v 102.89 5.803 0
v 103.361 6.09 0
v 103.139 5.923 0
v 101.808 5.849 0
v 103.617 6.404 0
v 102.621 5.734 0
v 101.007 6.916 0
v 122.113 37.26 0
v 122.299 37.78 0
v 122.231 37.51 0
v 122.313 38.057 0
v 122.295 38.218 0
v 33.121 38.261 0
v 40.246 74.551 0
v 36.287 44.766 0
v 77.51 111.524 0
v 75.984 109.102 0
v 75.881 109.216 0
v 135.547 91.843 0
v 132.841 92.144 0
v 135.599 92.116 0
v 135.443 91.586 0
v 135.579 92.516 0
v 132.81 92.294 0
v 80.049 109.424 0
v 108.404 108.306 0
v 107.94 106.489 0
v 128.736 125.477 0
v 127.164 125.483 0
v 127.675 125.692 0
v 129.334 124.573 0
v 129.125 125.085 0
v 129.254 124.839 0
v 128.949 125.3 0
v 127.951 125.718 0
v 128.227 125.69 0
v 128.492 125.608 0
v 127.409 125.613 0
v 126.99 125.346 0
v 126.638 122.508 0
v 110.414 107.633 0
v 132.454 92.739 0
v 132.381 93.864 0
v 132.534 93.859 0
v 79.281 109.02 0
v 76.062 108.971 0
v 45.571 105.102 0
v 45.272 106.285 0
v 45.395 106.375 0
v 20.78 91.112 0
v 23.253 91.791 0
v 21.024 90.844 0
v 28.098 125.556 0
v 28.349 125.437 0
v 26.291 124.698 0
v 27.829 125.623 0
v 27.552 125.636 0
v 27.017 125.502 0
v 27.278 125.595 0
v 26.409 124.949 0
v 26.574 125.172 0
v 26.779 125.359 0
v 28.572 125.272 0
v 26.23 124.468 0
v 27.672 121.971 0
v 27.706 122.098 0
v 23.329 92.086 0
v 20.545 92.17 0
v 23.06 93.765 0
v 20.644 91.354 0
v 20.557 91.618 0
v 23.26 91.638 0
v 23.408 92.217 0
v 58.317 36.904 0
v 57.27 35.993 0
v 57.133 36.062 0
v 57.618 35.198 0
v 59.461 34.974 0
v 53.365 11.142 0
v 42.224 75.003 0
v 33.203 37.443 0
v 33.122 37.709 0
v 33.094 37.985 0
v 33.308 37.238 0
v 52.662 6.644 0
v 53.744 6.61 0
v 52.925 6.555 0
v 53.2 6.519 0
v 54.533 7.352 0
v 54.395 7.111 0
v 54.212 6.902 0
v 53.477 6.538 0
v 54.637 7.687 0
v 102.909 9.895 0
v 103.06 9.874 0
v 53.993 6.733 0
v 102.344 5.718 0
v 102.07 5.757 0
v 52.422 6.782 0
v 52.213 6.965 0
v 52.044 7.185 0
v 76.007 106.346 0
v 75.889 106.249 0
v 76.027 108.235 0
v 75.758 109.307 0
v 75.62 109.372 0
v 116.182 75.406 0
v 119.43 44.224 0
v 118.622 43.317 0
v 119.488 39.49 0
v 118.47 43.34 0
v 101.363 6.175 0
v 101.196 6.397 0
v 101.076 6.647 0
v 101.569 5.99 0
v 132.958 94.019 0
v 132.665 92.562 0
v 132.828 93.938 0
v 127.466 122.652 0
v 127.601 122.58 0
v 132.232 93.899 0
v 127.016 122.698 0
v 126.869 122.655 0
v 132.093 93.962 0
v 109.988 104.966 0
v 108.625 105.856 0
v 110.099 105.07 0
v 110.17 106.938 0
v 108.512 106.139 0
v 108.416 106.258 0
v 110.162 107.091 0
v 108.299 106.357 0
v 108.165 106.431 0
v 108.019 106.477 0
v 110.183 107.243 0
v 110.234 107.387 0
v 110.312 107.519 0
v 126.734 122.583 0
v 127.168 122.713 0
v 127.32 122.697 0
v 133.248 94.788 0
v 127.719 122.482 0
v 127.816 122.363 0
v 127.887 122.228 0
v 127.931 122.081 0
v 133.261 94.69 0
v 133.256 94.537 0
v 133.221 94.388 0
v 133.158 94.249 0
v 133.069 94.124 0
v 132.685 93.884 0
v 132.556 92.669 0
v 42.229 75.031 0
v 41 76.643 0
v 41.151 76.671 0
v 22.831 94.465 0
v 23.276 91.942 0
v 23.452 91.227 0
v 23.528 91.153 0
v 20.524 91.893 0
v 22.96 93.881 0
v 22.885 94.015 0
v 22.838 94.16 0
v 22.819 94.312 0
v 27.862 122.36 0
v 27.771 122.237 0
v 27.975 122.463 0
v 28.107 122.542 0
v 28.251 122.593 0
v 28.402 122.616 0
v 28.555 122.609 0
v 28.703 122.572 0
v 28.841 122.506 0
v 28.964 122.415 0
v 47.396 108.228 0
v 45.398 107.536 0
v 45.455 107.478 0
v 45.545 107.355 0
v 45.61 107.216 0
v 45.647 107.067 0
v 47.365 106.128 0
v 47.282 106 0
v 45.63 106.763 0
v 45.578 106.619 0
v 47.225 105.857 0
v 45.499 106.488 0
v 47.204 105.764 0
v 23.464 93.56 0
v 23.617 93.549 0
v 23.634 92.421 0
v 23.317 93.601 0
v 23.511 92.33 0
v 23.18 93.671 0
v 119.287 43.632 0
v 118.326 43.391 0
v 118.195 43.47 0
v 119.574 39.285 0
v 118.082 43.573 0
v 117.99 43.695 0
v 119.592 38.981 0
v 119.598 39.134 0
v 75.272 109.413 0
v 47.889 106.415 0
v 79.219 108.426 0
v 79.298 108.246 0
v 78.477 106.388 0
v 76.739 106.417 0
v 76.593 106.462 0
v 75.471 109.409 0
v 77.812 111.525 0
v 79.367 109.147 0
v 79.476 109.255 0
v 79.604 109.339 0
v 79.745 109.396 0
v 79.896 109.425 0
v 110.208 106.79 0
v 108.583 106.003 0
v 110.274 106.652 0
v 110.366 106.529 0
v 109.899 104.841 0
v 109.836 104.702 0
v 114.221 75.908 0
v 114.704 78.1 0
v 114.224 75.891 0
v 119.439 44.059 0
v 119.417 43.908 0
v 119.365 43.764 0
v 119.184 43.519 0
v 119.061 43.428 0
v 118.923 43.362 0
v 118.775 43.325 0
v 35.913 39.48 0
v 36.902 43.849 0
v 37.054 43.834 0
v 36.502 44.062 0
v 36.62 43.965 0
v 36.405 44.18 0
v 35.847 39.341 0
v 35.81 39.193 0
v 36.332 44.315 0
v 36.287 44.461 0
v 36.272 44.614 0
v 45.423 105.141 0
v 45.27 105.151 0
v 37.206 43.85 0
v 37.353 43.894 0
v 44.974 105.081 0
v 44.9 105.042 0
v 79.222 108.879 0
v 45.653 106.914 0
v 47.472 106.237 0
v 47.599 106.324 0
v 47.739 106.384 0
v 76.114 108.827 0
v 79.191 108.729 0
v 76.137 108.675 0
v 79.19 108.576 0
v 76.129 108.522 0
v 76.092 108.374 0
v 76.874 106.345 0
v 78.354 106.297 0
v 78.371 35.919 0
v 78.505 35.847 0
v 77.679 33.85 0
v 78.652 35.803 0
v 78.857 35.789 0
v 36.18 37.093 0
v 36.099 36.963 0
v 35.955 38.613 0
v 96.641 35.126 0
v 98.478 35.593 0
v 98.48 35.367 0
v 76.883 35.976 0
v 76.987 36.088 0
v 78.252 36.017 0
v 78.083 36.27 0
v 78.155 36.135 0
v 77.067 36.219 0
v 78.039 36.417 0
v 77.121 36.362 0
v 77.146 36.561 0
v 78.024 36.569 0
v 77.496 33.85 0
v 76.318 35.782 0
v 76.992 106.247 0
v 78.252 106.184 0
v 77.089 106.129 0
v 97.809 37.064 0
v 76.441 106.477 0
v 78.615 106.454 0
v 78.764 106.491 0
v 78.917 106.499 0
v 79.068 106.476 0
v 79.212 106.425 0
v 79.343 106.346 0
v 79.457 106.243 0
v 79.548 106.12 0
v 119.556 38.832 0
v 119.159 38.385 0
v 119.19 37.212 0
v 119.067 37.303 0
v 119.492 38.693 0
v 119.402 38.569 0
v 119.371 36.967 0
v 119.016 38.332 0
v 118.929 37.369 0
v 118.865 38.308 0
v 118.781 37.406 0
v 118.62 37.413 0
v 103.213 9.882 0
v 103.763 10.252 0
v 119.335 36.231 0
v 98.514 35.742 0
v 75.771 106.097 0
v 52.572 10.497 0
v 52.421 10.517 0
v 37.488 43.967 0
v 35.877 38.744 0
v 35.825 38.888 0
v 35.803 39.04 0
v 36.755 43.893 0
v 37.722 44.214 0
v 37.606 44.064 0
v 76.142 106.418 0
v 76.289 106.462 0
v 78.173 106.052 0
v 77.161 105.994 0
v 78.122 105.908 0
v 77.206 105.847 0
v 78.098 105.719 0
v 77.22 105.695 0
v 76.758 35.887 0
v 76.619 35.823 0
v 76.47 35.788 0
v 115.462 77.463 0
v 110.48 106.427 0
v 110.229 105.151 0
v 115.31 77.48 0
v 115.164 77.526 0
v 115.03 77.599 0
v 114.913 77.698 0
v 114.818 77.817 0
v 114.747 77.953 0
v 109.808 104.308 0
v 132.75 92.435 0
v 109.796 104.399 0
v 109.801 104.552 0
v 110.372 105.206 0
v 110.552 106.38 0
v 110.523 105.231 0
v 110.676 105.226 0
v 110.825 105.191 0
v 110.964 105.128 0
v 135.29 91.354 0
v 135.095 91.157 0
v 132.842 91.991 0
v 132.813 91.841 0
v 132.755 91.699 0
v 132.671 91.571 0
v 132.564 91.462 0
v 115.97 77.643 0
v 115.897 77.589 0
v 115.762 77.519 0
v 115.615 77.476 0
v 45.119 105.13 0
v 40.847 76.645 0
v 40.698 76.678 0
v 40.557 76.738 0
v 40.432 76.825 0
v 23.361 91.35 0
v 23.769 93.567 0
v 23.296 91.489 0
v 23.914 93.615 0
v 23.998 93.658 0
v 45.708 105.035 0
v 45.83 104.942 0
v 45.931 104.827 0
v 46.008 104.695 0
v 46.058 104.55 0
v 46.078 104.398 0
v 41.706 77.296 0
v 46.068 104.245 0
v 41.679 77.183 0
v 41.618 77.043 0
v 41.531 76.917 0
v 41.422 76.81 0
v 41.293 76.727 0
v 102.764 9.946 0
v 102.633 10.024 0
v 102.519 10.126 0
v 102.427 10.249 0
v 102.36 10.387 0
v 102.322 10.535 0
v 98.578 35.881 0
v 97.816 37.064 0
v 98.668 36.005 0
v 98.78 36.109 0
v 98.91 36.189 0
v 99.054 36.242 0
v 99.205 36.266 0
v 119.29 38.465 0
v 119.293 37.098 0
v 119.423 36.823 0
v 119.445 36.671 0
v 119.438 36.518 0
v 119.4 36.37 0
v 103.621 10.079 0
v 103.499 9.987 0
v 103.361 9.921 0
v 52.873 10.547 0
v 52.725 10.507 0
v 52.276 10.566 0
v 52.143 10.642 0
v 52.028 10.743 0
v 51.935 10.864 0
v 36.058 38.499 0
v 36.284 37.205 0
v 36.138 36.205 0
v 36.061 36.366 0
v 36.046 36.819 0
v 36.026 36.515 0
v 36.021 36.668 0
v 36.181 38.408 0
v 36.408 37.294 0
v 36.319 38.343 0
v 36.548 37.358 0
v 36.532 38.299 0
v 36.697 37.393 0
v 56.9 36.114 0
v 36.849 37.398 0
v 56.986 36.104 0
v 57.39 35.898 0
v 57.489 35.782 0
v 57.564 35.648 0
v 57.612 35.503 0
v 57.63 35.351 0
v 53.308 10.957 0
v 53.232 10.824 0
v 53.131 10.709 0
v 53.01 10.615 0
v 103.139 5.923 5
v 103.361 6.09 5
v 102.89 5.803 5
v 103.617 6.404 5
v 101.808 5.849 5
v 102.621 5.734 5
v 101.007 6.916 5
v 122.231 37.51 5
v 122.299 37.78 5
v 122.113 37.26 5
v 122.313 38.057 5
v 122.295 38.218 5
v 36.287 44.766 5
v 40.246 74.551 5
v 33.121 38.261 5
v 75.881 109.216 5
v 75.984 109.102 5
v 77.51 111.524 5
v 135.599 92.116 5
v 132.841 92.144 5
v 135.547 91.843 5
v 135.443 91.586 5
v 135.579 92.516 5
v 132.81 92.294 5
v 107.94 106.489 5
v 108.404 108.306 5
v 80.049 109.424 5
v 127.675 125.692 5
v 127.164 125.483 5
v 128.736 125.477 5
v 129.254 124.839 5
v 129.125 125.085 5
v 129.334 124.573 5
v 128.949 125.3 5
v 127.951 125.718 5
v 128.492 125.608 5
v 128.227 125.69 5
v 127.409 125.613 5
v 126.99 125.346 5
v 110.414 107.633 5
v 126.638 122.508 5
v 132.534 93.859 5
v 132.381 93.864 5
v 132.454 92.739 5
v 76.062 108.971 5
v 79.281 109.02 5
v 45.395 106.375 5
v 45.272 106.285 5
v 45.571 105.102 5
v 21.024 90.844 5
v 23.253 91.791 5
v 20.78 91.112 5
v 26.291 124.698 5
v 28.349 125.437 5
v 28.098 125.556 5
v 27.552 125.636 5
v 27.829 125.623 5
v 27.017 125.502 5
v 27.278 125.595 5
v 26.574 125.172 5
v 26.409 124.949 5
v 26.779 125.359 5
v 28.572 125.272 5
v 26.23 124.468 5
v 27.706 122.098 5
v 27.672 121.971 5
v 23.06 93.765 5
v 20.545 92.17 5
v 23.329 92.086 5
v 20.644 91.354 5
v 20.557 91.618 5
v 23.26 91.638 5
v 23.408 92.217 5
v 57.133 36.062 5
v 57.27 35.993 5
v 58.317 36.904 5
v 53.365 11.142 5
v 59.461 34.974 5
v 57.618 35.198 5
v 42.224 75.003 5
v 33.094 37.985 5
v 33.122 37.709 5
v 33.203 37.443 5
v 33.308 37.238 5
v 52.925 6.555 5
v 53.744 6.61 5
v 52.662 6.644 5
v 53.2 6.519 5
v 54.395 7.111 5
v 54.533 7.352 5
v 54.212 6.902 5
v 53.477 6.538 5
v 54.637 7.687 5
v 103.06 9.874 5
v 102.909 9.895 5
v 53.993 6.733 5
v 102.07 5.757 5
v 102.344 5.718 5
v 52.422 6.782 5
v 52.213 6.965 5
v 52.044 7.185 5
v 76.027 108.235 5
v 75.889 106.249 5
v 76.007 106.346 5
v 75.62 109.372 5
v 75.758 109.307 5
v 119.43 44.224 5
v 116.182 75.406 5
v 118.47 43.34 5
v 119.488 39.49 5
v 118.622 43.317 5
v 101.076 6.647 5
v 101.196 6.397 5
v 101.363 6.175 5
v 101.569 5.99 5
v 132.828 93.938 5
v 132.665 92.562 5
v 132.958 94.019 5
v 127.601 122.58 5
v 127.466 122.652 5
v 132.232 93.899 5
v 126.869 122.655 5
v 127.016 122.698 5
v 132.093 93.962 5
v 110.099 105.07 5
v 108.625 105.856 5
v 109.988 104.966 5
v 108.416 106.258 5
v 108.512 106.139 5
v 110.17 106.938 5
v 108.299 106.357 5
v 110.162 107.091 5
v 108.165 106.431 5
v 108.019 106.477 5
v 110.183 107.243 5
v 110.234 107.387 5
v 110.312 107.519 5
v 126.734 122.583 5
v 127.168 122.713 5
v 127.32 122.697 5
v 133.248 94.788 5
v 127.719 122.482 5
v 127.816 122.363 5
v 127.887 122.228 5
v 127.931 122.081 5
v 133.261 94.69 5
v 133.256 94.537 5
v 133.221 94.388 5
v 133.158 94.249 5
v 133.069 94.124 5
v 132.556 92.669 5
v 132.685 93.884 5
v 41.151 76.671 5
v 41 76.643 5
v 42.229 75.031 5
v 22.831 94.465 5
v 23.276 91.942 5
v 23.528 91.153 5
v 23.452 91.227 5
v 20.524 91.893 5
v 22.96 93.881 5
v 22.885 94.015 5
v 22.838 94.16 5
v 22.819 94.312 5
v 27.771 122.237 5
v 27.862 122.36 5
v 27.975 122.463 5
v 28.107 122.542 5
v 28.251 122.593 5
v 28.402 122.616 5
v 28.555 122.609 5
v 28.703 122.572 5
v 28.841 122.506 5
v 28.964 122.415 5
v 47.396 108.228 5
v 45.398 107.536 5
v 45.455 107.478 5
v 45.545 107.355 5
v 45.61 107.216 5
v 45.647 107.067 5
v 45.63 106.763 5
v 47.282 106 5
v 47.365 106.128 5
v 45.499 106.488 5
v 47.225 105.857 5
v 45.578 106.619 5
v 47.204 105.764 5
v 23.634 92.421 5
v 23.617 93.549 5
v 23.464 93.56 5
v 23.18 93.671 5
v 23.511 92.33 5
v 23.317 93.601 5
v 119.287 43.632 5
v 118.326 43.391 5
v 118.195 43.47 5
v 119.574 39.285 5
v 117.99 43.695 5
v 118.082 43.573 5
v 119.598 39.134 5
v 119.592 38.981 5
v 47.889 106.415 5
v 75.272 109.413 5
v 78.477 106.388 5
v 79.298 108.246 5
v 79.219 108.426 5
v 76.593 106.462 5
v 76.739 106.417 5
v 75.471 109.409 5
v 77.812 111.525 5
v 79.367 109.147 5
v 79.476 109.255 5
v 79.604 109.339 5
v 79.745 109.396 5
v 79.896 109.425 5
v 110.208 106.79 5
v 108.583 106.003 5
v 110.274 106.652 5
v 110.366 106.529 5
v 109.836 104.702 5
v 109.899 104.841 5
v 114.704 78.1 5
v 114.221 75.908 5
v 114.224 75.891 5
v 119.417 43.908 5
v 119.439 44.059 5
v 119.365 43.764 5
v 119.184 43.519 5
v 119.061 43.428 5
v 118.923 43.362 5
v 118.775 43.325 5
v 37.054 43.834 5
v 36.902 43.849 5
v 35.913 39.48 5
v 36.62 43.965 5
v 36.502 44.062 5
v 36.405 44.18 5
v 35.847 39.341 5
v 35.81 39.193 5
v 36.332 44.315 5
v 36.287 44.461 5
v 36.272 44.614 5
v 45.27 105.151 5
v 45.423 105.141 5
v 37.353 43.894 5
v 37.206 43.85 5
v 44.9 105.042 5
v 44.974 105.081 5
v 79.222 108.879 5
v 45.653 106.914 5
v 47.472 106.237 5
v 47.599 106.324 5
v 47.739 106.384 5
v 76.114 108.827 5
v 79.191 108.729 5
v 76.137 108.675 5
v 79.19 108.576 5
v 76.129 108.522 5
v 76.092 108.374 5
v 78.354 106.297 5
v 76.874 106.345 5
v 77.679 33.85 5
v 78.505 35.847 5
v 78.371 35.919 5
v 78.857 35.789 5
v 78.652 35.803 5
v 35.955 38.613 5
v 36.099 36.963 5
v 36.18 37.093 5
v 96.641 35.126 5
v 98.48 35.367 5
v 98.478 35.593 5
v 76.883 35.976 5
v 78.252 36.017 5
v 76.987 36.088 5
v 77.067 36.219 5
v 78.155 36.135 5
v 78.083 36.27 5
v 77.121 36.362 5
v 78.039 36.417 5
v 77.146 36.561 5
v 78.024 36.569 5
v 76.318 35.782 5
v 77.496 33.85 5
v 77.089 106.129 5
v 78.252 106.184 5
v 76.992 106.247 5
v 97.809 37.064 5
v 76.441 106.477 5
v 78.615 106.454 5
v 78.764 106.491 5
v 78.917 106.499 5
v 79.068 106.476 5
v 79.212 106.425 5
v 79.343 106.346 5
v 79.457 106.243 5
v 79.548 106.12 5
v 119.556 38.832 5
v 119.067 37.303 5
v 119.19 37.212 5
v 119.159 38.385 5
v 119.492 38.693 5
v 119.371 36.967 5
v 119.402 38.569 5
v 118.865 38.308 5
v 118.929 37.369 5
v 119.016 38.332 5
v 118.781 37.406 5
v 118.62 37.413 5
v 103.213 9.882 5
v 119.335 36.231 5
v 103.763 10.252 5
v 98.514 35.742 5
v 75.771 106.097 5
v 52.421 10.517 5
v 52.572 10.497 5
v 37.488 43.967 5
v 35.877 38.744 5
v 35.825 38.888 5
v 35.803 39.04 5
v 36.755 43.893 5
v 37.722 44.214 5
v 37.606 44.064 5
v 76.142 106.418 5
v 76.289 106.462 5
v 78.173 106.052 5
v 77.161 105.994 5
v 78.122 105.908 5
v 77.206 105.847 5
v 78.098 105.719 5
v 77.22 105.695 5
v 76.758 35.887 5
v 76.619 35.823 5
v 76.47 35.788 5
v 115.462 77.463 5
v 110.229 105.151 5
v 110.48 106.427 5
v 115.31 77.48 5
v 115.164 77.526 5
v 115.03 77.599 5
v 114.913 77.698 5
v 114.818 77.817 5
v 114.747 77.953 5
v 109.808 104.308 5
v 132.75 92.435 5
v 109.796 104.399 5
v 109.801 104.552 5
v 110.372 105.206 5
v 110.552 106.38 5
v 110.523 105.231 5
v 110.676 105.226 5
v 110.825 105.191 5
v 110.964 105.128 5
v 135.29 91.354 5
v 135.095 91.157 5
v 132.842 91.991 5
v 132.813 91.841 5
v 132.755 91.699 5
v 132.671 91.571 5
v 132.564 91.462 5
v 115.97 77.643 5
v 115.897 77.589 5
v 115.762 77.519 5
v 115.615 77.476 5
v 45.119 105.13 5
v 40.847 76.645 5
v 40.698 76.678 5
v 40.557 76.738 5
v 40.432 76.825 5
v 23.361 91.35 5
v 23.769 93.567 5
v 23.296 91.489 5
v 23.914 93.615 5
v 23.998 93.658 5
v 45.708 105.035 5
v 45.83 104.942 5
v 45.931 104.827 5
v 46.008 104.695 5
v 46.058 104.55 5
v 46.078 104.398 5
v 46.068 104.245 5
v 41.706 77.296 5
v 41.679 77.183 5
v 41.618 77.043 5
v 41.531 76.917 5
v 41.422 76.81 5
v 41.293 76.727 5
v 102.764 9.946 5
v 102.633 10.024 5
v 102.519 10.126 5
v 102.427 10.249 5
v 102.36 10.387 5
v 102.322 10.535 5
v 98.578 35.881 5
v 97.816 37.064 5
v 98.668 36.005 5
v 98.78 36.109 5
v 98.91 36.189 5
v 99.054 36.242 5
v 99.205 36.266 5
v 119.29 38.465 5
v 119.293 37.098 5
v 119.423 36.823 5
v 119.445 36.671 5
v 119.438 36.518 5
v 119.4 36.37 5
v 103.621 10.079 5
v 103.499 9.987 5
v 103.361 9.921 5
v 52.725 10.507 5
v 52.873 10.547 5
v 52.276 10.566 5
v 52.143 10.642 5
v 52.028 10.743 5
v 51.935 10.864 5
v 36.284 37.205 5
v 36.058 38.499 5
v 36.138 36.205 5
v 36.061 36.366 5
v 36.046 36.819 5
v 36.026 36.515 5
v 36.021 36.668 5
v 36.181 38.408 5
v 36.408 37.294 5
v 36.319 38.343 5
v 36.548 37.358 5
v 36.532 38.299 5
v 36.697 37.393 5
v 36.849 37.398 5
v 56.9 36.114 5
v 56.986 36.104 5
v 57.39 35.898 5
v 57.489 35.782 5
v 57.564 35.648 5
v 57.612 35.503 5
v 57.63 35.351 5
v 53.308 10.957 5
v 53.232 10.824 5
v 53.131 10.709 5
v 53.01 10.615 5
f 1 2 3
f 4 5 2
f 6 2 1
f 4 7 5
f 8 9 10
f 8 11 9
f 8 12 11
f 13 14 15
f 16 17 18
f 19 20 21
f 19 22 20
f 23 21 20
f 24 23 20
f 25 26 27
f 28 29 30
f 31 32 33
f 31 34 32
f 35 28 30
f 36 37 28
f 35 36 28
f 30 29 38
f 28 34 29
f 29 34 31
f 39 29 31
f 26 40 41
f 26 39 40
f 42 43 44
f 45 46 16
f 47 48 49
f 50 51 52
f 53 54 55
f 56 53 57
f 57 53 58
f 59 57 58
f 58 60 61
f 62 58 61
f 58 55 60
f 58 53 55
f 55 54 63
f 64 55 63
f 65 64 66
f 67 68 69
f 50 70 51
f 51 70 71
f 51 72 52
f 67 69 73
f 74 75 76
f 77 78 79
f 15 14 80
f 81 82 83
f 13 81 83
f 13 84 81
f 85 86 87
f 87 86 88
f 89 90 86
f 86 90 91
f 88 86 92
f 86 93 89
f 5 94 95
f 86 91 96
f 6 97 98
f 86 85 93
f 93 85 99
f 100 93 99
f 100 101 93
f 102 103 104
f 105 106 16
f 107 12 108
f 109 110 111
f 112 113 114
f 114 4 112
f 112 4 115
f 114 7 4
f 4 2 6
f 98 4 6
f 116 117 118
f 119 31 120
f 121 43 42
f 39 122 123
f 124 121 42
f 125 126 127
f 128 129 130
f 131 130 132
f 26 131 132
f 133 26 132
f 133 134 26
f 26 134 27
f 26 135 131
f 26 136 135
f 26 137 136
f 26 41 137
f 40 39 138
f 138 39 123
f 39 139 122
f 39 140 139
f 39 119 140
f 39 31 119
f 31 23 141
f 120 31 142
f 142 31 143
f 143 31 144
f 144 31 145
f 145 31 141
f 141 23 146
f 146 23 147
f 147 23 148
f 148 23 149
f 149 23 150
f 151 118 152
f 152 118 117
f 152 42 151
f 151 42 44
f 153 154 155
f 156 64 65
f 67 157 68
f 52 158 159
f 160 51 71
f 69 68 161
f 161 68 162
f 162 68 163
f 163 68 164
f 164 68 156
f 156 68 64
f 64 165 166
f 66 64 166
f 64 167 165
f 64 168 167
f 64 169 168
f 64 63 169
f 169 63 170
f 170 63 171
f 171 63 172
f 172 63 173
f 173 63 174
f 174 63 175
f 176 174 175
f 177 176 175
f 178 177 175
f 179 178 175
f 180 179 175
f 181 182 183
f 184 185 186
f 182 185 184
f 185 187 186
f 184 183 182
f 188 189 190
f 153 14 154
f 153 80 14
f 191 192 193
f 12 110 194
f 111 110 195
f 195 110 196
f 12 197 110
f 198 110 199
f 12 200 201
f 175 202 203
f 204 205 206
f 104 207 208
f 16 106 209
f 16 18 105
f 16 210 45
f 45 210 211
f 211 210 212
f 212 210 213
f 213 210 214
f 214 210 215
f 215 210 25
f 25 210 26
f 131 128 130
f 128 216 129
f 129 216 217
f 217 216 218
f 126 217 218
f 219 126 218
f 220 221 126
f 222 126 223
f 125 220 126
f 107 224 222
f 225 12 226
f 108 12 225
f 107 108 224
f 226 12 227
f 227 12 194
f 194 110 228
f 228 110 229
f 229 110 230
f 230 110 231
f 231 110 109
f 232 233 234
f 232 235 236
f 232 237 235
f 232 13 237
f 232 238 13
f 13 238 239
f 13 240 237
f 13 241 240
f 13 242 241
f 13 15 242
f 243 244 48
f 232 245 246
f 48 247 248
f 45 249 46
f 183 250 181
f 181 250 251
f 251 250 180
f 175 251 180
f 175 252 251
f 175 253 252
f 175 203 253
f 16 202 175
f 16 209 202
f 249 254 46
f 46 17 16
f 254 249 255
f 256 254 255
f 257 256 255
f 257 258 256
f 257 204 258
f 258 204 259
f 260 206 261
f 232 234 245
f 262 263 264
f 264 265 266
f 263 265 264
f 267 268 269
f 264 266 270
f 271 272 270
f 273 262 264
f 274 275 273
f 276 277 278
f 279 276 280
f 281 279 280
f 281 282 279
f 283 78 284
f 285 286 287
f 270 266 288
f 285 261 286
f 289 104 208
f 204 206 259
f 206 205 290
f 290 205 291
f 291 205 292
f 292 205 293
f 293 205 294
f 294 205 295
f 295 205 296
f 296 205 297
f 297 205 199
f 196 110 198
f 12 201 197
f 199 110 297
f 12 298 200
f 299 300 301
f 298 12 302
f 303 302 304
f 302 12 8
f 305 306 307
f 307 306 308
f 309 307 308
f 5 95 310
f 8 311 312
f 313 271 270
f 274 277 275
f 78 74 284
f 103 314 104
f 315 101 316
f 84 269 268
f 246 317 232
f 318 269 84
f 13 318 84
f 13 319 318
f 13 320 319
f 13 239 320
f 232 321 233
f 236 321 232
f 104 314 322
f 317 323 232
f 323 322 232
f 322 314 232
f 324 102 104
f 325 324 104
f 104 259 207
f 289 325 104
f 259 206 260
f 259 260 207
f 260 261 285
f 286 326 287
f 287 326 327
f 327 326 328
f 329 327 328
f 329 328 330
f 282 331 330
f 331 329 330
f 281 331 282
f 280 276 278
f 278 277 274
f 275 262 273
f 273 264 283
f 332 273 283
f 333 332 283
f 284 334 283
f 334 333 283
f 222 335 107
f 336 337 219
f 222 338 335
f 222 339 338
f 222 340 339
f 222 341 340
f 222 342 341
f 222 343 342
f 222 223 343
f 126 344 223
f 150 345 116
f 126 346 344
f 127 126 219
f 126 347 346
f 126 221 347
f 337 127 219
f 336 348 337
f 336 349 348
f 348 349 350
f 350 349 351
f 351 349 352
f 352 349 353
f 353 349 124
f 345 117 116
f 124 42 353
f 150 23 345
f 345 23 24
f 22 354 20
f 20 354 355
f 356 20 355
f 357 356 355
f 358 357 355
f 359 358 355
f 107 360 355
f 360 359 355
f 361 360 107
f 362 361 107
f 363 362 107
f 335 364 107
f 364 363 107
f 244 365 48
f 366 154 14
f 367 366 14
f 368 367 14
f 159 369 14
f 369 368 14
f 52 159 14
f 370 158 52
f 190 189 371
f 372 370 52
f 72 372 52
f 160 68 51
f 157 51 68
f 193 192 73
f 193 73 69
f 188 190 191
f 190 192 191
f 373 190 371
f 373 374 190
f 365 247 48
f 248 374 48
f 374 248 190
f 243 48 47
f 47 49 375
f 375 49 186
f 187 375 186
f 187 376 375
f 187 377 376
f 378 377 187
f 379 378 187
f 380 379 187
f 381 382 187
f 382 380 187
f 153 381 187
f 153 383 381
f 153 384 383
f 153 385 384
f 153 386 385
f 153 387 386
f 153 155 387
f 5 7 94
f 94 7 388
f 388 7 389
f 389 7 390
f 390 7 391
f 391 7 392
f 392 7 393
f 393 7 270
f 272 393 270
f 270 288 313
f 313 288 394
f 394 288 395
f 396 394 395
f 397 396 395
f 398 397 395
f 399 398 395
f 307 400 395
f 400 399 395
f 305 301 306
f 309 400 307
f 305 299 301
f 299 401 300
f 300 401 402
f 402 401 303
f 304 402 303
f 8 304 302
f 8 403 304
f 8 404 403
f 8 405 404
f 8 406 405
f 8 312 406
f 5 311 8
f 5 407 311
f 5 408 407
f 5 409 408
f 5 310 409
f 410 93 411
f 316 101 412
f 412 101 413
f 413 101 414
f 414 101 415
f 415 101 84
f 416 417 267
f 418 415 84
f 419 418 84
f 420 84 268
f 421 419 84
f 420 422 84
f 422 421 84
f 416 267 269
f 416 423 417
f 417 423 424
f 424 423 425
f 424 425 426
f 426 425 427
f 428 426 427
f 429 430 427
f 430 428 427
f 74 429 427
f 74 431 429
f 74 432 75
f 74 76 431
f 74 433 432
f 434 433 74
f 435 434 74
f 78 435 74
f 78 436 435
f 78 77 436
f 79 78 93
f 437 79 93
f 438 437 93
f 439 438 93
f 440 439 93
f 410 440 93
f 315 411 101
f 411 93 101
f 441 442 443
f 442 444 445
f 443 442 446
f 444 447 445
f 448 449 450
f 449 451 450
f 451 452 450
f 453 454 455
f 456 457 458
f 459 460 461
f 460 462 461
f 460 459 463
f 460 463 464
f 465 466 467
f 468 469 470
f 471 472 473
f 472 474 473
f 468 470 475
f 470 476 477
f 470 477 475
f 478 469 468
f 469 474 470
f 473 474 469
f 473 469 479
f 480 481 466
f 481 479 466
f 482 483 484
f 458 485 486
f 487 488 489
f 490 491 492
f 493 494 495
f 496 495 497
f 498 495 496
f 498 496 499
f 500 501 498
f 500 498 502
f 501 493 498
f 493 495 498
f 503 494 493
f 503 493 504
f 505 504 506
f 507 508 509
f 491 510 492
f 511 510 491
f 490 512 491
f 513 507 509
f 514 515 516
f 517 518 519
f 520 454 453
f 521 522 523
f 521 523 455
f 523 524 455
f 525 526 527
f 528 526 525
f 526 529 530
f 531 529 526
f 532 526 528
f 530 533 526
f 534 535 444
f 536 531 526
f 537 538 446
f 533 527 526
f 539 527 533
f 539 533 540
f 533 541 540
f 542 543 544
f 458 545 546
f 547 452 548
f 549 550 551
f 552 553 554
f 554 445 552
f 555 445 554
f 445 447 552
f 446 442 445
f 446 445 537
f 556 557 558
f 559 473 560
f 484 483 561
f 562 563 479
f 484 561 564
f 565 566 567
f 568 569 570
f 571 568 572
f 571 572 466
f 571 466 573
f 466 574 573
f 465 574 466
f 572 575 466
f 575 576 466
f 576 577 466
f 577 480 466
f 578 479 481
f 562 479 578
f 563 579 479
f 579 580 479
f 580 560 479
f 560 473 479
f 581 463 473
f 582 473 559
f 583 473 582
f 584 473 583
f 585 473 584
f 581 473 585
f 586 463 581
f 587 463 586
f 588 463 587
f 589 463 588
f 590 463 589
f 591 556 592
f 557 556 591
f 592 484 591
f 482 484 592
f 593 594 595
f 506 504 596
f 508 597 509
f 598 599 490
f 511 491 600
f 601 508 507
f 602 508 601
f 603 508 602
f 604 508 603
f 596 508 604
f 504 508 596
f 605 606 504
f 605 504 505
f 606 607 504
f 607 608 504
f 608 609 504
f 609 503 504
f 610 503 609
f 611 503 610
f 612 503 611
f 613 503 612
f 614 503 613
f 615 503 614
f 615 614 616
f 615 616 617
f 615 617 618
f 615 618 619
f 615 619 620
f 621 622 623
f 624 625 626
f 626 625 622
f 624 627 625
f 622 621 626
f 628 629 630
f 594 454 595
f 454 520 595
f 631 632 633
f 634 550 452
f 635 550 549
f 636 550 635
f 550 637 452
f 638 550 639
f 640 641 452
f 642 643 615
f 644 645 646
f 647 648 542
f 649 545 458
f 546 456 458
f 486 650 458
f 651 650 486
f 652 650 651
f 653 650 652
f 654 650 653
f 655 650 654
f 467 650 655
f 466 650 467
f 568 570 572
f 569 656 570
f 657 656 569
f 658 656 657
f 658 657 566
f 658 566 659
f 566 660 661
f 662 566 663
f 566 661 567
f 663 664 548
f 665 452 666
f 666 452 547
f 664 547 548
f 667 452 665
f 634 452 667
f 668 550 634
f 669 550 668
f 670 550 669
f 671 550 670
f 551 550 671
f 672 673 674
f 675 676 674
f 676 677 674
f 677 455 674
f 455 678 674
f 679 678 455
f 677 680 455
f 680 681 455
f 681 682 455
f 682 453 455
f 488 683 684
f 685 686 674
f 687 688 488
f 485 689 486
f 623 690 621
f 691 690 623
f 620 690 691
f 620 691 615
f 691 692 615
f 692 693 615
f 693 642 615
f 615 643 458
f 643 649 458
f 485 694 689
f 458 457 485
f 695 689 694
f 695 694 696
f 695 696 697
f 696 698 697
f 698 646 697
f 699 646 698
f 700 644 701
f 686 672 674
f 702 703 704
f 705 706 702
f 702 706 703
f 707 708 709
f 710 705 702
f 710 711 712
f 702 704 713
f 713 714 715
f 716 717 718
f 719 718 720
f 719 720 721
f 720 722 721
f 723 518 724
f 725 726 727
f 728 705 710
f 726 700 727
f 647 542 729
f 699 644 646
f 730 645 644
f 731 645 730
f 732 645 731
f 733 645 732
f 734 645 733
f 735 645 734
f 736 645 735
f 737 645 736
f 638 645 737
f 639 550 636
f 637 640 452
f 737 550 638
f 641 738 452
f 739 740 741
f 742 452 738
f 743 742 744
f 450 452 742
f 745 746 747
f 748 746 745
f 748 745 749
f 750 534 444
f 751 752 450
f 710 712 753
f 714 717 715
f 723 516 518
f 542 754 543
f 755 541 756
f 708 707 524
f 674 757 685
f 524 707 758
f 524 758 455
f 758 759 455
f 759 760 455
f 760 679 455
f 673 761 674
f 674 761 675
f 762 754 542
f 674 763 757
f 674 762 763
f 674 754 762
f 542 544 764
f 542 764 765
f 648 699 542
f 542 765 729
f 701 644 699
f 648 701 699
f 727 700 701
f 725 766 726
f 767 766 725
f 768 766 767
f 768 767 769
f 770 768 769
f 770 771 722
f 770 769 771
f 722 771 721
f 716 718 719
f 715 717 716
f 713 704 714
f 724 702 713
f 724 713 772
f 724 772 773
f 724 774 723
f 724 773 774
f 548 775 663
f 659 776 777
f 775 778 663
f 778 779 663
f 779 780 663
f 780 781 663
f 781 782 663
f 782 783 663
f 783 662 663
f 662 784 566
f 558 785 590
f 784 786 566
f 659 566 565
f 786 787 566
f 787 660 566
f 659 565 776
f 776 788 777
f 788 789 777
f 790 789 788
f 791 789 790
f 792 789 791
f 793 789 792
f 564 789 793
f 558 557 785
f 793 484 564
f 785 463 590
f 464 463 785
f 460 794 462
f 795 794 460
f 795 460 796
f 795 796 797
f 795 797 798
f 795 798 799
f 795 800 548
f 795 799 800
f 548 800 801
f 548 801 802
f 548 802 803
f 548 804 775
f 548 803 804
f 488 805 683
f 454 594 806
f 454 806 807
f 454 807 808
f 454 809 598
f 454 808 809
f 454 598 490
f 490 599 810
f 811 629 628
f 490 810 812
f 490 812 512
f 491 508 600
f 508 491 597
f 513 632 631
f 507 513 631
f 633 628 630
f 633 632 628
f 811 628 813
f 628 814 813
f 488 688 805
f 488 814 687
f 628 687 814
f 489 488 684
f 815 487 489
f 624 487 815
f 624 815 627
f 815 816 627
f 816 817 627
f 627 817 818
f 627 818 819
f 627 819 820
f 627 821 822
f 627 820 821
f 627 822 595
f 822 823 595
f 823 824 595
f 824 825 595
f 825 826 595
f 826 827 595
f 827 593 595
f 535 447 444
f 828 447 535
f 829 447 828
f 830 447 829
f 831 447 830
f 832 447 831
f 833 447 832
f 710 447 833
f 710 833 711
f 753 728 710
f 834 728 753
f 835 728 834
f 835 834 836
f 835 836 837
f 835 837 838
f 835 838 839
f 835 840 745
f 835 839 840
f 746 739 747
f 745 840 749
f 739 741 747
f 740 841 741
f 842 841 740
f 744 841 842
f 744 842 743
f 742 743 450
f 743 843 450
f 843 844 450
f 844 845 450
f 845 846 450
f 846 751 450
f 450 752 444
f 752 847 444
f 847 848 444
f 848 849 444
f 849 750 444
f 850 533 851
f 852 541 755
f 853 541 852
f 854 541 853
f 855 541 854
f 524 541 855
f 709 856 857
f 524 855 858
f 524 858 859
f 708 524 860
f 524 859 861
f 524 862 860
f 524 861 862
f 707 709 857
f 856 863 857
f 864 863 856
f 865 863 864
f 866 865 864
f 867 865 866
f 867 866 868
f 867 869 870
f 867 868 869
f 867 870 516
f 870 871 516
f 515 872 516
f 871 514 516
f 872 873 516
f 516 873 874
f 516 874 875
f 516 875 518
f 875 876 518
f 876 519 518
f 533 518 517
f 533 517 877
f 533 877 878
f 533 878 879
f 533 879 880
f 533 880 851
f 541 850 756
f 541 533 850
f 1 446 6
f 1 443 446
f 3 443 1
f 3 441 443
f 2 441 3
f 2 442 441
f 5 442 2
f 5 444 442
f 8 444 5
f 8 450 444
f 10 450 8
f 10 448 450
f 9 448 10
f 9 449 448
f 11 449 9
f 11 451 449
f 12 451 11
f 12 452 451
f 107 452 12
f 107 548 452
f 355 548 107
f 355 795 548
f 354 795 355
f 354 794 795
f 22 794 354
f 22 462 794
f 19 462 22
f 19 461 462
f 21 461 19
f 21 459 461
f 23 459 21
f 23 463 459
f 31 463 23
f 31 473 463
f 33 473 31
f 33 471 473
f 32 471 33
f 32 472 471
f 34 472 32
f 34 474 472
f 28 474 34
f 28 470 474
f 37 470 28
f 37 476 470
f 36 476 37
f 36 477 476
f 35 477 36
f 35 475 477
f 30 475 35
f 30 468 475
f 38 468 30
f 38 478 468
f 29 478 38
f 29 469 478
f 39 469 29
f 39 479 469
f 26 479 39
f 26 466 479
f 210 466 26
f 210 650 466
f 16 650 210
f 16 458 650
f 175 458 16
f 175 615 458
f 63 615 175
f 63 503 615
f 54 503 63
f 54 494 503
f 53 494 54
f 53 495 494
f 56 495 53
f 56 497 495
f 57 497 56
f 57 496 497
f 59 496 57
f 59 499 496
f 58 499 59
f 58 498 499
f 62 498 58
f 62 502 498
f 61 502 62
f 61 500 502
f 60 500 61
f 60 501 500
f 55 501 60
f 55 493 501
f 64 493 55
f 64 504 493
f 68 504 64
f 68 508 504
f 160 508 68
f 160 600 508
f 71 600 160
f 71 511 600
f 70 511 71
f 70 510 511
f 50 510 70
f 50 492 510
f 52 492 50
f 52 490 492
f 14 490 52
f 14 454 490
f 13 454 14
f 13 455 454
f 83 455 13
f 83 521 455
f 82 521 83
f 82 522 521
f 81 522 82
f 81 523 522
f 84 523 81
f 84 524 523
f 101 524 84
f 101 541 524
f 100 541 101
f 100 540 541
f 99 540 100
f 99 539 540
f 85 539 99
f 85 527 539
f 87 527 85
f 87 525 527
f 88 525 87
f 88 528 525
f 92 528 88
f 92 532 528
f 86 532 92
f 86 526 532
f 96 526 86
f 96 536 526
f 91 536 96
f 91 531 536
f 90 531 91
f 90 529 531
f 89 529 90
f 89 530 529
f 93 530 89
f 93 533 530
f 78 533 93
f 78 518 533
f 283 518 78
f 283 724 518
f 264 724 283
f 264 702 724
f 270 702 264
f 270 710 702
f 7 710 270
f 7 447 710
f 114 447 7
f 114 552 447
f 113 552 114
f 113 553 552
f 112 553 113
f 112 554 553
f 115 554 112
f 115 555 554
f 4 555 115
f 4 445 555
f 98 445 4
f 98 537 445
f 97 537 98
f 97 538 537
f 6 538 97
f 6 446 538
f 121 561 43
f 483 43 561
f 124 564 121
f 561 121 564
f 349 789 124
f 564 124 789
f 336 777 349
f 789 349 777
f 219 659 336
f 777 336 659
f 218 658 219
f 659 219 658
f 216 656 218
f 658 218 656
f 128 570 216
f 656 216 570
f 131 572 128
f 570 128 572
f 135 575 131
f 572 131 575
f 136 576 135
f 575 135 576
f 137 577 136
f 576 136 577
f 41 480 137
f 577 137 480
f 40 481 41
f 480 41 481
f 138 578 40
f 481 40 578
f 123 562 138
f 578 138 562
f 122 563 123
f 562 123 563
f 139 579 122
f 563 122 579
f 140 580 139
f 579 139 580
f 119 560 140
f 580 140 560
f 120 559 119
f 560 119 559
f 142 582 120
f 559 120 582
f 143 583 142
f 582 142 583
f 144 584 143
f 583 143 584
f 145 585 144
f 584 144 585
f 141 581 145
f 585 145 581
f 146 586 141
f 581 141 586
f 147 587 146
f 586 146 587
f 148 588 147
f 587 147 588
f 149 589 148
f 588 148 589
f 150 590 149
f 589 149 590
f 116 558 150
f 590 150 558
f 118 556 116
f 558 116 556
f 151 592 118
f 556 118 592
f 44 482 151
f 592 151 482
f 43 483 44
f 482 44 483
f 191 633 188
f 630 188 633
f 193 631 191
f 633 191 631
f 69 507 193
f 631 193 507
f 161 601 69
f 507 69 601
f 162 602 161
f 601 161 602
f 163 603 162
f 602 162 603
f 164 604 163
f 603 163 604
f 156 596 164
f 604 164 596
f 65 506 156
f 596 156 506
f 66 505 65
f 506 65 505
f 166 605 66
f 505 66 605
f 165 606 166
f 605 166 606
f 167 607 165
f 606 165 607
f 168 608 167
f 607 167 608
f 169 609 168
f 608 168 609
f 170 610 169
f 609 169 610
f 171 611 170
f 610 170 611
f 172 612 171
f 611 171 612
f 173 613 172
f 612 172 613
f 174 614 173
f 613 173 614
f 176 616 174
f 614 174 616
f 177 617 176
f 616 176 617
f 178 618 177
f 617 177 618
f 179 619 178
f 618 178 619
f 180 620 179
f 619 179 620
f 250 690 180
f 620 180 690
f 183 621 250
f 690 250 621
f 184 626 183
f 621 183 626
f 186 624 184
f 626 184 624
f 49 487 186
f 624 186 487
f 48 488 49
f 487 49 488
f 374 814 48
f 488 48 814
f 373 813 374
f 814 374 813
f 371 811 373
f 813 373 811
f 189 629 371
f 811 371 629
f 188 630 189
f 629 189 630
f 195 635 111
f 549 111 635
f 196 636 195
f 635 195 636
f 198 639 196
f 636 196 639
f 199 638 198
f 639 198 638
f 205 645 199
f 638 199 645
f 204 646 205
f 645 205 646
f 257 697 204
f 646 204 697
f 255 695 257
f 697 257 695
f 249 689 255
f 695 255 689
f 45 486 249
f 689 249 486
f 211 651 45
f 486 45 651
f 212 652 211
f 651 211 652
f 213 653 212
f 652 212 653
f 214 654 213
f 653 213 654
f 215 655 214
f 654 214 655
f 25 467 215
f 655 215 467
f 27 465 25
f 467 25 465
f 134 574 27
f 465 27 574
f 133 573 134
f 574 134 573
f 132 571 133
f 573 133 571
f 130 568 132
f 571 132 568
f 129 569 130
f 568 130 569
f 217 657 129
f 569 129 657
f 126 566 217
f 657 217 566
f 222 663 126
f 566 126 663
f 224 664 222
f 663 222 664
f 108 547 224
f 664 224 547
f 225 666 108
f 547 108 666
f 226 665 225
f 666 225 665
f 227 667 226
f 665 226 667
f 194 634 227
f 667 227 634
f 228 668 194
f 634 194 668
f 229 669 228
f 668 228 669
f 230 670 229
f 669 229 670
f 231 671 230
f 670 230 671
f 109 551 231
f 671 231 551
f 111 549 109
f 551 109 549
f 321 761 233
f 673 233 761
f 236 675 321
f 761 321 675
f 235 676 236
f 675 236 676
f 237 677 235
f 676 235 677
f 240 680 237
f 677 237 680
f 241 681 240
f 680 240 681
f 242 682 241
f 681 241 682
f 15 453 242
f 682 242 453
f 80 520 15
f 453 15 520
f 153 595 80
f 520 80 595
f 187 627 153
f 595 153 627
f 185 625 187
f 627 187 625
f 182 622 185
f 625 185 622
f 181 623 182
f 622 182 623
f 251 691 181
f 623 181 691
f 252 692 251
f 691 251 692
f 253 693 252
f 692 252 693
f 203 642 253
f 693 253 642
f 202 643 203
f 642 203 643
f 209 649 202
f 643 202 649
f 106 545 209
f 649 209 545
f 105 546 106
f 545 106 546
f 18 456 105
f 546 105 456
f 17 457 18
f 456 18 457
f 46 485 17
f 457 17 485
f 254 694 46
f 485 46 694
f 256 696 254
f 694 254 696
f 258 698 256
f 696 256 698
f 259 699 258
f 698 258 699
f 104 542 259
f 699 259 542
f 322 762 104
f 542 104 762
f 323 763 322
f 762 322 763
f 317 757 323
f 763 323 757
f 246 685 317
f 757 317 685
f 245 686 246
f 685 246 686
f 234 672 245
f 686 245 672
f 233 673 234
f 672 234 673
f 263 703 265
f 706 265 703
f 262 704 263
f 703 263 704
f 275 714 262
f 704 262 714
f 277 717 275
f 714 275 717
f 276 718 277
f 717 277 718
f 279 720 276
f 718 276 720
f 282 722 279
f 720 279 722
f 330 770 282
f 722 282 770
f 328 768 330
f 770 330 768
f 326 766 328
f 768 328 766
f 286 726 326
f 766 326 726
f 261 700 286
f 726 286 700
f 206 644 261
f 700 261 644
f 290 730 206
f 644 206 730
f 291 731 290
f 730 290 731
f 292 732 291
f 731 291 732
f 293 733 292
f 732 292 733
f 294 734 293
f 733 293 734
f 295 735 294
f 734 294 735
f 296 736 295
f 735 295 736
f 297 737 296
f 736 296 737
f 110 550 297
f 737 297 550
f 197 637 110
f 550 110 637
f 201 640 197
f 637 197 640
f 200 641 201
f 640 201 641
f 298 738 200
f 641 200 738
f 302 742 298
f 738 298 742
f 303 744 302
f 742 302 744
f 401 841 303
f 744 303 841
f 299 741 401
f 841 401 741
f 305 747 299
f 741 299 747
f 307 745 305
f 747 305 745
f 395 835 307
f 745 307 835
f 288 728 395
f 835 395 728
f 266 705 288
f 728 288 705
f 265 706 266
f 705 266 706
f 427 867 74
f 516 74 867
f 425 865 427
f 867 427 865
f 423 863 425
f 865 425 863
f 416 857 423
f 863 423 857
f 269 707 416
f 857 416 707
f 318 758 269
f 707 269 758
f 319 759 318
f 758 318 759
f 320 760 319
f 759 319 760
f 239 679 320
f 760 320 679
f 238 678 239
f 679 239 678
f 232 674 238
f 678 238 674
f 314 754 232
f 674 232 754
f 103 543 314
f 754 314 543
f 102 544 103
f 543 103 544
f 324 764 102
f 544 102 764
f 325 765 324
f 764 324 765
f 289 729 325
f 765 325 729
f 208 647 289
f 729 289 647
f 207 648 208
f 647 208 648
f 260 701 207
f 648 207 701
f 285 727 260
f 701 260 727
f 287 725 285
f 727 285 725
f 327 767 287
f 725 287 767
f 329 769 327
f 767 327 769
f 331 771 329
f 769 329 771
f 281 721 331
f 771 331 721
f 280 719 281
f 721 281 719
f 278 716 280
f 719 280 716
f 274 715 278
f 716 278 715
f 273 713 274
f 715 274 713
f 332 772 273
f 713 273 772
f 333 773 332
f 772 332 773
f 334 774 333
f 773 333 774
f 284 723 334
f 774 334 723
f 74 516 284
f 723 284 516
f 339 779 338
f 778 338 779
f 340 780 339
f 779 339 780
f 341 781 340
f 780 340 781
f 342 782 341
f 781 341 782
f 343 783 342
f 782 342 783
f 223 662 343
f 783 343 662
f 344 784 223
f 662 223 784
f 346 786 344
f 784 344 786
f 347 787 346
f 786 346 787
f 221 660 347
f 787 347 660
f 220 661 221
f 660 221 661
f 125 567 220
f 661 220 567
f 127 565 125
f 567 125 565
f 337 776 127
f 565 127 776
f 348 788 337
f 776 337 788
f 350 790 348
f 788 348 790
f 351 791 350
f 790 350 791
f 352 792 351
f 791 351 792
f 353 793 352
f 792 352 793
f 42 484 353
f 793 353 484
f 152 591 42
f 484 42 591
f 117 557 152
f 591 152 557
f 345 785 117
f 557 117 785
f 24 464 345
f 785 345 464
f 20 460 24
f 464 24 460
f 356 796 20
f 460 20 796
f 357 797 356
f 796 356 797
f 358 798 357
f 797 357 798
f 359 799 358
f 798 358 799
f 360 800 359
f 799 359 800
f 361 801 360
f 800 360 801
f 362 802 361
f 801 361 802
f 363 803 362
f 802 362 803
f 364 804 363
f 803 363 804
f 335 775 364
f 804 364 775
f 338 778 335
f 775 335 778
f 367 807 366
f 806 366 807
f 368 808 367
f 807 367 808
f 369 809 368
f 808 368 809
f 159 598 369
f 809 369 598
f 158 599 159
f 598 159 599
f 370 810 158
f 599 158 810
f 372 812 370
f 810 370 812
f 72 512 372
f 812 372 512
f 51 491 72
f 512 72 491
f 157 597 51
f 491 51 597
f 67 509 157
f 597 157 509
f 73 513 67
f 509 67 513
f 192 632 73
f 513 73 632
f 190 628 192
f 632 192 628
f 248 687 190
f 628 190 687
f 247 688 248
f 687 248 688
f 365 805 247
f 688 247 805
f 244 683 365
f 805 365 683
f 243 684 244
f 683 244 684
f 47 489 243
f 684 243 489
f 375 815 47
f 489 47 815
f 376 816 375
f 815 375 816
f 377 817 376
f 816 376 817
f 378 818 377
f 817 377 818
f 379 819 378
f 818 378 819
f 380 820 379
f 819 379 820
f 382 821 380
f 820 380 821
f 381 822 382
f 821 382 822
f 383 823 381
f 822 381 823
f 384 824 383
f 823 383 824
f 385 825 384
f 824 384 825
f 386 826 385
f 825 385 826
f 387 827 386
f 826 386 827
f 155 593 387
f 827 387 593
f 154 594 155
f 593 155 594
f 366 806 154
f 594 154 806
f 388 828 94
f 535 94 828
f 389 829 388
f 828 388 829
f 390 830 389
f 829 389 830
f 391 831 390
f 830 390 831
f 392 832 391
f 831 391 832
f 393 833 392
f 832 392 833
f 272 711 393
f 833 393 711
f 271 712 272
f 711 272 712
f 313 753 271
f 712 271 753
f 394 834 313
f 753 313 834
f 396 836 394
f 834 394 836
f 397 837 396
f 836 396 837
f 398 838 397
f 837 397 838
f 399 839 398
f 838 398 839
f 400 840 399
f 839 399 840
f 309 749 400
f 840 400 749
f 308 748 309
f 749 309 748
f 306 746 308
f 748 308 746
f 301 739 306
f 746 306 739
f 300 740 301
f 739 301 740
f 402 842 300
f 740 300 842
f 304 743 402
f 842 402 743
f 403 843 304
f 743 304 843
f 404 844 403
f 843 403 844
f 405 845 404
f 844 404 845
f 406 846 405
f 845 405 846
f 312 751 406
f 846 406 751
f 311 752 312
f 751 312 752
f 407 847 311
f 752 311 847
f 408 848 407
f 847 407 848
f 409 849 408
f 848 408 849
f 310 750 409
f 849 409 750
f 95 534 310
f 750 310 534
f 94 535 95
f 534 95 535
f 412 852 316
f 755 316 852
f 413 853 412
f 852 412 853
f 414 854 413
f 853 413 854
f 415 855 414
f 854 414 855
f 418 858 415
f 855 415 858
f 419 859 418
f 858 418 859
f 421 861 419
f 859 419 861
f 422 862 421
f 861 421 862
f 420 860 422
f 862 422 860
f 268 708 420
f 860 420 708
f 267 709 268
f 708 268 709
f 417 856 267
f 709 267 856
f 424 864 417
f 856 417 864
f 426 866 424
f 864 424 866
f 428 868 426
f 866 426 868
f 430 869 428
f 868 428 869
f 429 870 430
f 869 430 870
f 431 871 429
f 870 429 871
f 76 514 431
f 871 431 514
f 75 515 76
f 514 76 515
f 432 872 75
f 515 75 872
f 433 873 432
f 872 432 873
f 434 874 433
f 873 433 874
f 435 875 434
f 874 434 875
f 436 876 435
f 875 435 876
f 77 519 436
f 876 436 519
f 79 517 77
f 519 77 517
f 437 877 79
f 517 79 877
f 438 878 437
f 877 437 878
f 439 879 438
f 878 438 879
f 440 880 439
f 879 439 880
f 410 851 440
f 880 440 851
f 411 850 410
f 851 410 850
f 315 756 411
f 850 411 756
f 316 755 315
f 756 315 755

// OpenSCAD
/*
 * Customizable Origami - Crab - https://www.thingiverse.com/thing:2749619
 * by Dennis Hofmann - https://www.thingiverse.com/mightynozzle/about
 * created 2018-01-07
 * version v1.0
 *
 * Changelog
 * --------------
 * v1.0:
 *      - final design
 * --------------
 * 
 * This work is licensed under the Creative Commons - Attribution - NonCommercial - ShareAlike license.
 * https://creativecommons.org/licenses/by-nc-sa/3.0/
 */


 // Parameter Section //
//-------------------//

// preview[view:north, tilt:top]

// The maximum size of the longest side. The shorter side will be automatically resized in same ratio.
max_size_in_millimeter = 120; //[20:300]

// The height of the model.
model_height_in_millimeter = 5; //[0.2:0.2:100]

// Thickness of the outer outline.
outline_size_in_millimeter = 1.9; //[0.5:0.1:20]

// Thickness of the inner outline.
inline_size_in_millimeter = 0.9; //[0.5:0.1:20]

// Roundiness of the ends of the inner outlines.
inline_edge_radius_in_millimeter = 0.8; //[0.0:0.1:5]

// Flip model
flip_model = "no"; //[yes,no]

/*[hidden]*/
max_size = max_size_in_millimeter;
model_height = model_height_in_millimeter;
$fn=32;

// Outer Points
A1 = [665, 99];
A2 = [728, 455];
A3 = [969, 440];
A4 = [1222, 457];
A5 = [1279, 89];
A6 = [1510, 474];
A7 = [1432, 948];
A8 = [1676, 1151];
A9 = [1598, 1551];
A10 = [1360, 1333];
A11 = [970, 1374];
A12 = [586, 1332];
A13 = [345, 1550];
A14 = [274, 1147];
A15 = [522, 937];
A16 = [431, 474];

outline = [A1, A2, A3, A4, A5, A6, A7, A8, A9, A10, A11, A12, A13, A14, A15, A16];

// Inner Points

// Polygons
C1 = [A16, A1, A2];
C2 = [A5, A6, A4];
C3 = [A16, A2, A3, A11];
C4 = [A16, A15, A12, A11];
C5 = [A15, A14, A12];
C6 = [A14, A13, A12];
C7 = [A3, A4, A6, A11];
C8 = [A6, A7, A10, A11];
C9 = [A7, A8, A10];
C10 = [A10, A9, A8];

cut_polygons = [C1, C2, C3, C4, C5, C6, C7, C8, C9, C10];

min_x = A14[0];
min_y = A5[1];
max_x = A8[0];
max_y = A9[1];

x_size = max_x - min_x;
y_size = max_y - min_y;

x_factor = max_size / x_size;
y_factor = max_size / y_size;

inline_size = x_size > y_size ? inline_size_in_millimeter / x_factor / 2: inline_size_in_millimeter / y_factor / 2;
inline_edge_radius = x_size > y_size ? inline_edge_radius_in_millimeter / x_factor: inline_edge_radius_in_millimeter / y_factor;
outline_size = x_size > y_size ? outline_size_in_millimeter / x_factor - inline_size: outline_size_in_millimeter / y_factor - inline_size;


 // Program Section //
//-----------------//

if(x_size > y_size) {
    resize(newsize=[max_size, x_factor * y_size, model_height]){
        if(flip_model == "yes") {
            mirror([0,1,0]) {
                rotate([180,180,0]) {    
                    create(outline, cut_polygons);
                }
            }
        } else {
            create(outline, cut_polygons);
        }
    }
} else {
    resize(newsize=[y_factor * x_size, max_size, model_height]){
        if(flip_model == "yes") {
            mirror([0,1,0]) {
                rotate([180,180,0]) {    
                    create(outline, cut_polygons);
                }
            }
        } else {
            create(outline, cut_polygons);
        }
    }
}


 // Module Section //
//----------------//

module create() {
    linear_extrude(height=1) {
        difference() {
            offset(r = -0) {
                offset(r = +outline_size) {
                    polygon(points = outline, convexity = 10);
                }
            }
            
            for(cut_polygon = [0:len(cut_polygons)]) {
                offset(r = +inline_edge_radius) {
                    offset(r = -inline_size - inline_edge_radius) {
                        polygon(points = cut_polygons[cut_polygon], convexity = 10);
                    }
                }
            }
        }
    }
}
